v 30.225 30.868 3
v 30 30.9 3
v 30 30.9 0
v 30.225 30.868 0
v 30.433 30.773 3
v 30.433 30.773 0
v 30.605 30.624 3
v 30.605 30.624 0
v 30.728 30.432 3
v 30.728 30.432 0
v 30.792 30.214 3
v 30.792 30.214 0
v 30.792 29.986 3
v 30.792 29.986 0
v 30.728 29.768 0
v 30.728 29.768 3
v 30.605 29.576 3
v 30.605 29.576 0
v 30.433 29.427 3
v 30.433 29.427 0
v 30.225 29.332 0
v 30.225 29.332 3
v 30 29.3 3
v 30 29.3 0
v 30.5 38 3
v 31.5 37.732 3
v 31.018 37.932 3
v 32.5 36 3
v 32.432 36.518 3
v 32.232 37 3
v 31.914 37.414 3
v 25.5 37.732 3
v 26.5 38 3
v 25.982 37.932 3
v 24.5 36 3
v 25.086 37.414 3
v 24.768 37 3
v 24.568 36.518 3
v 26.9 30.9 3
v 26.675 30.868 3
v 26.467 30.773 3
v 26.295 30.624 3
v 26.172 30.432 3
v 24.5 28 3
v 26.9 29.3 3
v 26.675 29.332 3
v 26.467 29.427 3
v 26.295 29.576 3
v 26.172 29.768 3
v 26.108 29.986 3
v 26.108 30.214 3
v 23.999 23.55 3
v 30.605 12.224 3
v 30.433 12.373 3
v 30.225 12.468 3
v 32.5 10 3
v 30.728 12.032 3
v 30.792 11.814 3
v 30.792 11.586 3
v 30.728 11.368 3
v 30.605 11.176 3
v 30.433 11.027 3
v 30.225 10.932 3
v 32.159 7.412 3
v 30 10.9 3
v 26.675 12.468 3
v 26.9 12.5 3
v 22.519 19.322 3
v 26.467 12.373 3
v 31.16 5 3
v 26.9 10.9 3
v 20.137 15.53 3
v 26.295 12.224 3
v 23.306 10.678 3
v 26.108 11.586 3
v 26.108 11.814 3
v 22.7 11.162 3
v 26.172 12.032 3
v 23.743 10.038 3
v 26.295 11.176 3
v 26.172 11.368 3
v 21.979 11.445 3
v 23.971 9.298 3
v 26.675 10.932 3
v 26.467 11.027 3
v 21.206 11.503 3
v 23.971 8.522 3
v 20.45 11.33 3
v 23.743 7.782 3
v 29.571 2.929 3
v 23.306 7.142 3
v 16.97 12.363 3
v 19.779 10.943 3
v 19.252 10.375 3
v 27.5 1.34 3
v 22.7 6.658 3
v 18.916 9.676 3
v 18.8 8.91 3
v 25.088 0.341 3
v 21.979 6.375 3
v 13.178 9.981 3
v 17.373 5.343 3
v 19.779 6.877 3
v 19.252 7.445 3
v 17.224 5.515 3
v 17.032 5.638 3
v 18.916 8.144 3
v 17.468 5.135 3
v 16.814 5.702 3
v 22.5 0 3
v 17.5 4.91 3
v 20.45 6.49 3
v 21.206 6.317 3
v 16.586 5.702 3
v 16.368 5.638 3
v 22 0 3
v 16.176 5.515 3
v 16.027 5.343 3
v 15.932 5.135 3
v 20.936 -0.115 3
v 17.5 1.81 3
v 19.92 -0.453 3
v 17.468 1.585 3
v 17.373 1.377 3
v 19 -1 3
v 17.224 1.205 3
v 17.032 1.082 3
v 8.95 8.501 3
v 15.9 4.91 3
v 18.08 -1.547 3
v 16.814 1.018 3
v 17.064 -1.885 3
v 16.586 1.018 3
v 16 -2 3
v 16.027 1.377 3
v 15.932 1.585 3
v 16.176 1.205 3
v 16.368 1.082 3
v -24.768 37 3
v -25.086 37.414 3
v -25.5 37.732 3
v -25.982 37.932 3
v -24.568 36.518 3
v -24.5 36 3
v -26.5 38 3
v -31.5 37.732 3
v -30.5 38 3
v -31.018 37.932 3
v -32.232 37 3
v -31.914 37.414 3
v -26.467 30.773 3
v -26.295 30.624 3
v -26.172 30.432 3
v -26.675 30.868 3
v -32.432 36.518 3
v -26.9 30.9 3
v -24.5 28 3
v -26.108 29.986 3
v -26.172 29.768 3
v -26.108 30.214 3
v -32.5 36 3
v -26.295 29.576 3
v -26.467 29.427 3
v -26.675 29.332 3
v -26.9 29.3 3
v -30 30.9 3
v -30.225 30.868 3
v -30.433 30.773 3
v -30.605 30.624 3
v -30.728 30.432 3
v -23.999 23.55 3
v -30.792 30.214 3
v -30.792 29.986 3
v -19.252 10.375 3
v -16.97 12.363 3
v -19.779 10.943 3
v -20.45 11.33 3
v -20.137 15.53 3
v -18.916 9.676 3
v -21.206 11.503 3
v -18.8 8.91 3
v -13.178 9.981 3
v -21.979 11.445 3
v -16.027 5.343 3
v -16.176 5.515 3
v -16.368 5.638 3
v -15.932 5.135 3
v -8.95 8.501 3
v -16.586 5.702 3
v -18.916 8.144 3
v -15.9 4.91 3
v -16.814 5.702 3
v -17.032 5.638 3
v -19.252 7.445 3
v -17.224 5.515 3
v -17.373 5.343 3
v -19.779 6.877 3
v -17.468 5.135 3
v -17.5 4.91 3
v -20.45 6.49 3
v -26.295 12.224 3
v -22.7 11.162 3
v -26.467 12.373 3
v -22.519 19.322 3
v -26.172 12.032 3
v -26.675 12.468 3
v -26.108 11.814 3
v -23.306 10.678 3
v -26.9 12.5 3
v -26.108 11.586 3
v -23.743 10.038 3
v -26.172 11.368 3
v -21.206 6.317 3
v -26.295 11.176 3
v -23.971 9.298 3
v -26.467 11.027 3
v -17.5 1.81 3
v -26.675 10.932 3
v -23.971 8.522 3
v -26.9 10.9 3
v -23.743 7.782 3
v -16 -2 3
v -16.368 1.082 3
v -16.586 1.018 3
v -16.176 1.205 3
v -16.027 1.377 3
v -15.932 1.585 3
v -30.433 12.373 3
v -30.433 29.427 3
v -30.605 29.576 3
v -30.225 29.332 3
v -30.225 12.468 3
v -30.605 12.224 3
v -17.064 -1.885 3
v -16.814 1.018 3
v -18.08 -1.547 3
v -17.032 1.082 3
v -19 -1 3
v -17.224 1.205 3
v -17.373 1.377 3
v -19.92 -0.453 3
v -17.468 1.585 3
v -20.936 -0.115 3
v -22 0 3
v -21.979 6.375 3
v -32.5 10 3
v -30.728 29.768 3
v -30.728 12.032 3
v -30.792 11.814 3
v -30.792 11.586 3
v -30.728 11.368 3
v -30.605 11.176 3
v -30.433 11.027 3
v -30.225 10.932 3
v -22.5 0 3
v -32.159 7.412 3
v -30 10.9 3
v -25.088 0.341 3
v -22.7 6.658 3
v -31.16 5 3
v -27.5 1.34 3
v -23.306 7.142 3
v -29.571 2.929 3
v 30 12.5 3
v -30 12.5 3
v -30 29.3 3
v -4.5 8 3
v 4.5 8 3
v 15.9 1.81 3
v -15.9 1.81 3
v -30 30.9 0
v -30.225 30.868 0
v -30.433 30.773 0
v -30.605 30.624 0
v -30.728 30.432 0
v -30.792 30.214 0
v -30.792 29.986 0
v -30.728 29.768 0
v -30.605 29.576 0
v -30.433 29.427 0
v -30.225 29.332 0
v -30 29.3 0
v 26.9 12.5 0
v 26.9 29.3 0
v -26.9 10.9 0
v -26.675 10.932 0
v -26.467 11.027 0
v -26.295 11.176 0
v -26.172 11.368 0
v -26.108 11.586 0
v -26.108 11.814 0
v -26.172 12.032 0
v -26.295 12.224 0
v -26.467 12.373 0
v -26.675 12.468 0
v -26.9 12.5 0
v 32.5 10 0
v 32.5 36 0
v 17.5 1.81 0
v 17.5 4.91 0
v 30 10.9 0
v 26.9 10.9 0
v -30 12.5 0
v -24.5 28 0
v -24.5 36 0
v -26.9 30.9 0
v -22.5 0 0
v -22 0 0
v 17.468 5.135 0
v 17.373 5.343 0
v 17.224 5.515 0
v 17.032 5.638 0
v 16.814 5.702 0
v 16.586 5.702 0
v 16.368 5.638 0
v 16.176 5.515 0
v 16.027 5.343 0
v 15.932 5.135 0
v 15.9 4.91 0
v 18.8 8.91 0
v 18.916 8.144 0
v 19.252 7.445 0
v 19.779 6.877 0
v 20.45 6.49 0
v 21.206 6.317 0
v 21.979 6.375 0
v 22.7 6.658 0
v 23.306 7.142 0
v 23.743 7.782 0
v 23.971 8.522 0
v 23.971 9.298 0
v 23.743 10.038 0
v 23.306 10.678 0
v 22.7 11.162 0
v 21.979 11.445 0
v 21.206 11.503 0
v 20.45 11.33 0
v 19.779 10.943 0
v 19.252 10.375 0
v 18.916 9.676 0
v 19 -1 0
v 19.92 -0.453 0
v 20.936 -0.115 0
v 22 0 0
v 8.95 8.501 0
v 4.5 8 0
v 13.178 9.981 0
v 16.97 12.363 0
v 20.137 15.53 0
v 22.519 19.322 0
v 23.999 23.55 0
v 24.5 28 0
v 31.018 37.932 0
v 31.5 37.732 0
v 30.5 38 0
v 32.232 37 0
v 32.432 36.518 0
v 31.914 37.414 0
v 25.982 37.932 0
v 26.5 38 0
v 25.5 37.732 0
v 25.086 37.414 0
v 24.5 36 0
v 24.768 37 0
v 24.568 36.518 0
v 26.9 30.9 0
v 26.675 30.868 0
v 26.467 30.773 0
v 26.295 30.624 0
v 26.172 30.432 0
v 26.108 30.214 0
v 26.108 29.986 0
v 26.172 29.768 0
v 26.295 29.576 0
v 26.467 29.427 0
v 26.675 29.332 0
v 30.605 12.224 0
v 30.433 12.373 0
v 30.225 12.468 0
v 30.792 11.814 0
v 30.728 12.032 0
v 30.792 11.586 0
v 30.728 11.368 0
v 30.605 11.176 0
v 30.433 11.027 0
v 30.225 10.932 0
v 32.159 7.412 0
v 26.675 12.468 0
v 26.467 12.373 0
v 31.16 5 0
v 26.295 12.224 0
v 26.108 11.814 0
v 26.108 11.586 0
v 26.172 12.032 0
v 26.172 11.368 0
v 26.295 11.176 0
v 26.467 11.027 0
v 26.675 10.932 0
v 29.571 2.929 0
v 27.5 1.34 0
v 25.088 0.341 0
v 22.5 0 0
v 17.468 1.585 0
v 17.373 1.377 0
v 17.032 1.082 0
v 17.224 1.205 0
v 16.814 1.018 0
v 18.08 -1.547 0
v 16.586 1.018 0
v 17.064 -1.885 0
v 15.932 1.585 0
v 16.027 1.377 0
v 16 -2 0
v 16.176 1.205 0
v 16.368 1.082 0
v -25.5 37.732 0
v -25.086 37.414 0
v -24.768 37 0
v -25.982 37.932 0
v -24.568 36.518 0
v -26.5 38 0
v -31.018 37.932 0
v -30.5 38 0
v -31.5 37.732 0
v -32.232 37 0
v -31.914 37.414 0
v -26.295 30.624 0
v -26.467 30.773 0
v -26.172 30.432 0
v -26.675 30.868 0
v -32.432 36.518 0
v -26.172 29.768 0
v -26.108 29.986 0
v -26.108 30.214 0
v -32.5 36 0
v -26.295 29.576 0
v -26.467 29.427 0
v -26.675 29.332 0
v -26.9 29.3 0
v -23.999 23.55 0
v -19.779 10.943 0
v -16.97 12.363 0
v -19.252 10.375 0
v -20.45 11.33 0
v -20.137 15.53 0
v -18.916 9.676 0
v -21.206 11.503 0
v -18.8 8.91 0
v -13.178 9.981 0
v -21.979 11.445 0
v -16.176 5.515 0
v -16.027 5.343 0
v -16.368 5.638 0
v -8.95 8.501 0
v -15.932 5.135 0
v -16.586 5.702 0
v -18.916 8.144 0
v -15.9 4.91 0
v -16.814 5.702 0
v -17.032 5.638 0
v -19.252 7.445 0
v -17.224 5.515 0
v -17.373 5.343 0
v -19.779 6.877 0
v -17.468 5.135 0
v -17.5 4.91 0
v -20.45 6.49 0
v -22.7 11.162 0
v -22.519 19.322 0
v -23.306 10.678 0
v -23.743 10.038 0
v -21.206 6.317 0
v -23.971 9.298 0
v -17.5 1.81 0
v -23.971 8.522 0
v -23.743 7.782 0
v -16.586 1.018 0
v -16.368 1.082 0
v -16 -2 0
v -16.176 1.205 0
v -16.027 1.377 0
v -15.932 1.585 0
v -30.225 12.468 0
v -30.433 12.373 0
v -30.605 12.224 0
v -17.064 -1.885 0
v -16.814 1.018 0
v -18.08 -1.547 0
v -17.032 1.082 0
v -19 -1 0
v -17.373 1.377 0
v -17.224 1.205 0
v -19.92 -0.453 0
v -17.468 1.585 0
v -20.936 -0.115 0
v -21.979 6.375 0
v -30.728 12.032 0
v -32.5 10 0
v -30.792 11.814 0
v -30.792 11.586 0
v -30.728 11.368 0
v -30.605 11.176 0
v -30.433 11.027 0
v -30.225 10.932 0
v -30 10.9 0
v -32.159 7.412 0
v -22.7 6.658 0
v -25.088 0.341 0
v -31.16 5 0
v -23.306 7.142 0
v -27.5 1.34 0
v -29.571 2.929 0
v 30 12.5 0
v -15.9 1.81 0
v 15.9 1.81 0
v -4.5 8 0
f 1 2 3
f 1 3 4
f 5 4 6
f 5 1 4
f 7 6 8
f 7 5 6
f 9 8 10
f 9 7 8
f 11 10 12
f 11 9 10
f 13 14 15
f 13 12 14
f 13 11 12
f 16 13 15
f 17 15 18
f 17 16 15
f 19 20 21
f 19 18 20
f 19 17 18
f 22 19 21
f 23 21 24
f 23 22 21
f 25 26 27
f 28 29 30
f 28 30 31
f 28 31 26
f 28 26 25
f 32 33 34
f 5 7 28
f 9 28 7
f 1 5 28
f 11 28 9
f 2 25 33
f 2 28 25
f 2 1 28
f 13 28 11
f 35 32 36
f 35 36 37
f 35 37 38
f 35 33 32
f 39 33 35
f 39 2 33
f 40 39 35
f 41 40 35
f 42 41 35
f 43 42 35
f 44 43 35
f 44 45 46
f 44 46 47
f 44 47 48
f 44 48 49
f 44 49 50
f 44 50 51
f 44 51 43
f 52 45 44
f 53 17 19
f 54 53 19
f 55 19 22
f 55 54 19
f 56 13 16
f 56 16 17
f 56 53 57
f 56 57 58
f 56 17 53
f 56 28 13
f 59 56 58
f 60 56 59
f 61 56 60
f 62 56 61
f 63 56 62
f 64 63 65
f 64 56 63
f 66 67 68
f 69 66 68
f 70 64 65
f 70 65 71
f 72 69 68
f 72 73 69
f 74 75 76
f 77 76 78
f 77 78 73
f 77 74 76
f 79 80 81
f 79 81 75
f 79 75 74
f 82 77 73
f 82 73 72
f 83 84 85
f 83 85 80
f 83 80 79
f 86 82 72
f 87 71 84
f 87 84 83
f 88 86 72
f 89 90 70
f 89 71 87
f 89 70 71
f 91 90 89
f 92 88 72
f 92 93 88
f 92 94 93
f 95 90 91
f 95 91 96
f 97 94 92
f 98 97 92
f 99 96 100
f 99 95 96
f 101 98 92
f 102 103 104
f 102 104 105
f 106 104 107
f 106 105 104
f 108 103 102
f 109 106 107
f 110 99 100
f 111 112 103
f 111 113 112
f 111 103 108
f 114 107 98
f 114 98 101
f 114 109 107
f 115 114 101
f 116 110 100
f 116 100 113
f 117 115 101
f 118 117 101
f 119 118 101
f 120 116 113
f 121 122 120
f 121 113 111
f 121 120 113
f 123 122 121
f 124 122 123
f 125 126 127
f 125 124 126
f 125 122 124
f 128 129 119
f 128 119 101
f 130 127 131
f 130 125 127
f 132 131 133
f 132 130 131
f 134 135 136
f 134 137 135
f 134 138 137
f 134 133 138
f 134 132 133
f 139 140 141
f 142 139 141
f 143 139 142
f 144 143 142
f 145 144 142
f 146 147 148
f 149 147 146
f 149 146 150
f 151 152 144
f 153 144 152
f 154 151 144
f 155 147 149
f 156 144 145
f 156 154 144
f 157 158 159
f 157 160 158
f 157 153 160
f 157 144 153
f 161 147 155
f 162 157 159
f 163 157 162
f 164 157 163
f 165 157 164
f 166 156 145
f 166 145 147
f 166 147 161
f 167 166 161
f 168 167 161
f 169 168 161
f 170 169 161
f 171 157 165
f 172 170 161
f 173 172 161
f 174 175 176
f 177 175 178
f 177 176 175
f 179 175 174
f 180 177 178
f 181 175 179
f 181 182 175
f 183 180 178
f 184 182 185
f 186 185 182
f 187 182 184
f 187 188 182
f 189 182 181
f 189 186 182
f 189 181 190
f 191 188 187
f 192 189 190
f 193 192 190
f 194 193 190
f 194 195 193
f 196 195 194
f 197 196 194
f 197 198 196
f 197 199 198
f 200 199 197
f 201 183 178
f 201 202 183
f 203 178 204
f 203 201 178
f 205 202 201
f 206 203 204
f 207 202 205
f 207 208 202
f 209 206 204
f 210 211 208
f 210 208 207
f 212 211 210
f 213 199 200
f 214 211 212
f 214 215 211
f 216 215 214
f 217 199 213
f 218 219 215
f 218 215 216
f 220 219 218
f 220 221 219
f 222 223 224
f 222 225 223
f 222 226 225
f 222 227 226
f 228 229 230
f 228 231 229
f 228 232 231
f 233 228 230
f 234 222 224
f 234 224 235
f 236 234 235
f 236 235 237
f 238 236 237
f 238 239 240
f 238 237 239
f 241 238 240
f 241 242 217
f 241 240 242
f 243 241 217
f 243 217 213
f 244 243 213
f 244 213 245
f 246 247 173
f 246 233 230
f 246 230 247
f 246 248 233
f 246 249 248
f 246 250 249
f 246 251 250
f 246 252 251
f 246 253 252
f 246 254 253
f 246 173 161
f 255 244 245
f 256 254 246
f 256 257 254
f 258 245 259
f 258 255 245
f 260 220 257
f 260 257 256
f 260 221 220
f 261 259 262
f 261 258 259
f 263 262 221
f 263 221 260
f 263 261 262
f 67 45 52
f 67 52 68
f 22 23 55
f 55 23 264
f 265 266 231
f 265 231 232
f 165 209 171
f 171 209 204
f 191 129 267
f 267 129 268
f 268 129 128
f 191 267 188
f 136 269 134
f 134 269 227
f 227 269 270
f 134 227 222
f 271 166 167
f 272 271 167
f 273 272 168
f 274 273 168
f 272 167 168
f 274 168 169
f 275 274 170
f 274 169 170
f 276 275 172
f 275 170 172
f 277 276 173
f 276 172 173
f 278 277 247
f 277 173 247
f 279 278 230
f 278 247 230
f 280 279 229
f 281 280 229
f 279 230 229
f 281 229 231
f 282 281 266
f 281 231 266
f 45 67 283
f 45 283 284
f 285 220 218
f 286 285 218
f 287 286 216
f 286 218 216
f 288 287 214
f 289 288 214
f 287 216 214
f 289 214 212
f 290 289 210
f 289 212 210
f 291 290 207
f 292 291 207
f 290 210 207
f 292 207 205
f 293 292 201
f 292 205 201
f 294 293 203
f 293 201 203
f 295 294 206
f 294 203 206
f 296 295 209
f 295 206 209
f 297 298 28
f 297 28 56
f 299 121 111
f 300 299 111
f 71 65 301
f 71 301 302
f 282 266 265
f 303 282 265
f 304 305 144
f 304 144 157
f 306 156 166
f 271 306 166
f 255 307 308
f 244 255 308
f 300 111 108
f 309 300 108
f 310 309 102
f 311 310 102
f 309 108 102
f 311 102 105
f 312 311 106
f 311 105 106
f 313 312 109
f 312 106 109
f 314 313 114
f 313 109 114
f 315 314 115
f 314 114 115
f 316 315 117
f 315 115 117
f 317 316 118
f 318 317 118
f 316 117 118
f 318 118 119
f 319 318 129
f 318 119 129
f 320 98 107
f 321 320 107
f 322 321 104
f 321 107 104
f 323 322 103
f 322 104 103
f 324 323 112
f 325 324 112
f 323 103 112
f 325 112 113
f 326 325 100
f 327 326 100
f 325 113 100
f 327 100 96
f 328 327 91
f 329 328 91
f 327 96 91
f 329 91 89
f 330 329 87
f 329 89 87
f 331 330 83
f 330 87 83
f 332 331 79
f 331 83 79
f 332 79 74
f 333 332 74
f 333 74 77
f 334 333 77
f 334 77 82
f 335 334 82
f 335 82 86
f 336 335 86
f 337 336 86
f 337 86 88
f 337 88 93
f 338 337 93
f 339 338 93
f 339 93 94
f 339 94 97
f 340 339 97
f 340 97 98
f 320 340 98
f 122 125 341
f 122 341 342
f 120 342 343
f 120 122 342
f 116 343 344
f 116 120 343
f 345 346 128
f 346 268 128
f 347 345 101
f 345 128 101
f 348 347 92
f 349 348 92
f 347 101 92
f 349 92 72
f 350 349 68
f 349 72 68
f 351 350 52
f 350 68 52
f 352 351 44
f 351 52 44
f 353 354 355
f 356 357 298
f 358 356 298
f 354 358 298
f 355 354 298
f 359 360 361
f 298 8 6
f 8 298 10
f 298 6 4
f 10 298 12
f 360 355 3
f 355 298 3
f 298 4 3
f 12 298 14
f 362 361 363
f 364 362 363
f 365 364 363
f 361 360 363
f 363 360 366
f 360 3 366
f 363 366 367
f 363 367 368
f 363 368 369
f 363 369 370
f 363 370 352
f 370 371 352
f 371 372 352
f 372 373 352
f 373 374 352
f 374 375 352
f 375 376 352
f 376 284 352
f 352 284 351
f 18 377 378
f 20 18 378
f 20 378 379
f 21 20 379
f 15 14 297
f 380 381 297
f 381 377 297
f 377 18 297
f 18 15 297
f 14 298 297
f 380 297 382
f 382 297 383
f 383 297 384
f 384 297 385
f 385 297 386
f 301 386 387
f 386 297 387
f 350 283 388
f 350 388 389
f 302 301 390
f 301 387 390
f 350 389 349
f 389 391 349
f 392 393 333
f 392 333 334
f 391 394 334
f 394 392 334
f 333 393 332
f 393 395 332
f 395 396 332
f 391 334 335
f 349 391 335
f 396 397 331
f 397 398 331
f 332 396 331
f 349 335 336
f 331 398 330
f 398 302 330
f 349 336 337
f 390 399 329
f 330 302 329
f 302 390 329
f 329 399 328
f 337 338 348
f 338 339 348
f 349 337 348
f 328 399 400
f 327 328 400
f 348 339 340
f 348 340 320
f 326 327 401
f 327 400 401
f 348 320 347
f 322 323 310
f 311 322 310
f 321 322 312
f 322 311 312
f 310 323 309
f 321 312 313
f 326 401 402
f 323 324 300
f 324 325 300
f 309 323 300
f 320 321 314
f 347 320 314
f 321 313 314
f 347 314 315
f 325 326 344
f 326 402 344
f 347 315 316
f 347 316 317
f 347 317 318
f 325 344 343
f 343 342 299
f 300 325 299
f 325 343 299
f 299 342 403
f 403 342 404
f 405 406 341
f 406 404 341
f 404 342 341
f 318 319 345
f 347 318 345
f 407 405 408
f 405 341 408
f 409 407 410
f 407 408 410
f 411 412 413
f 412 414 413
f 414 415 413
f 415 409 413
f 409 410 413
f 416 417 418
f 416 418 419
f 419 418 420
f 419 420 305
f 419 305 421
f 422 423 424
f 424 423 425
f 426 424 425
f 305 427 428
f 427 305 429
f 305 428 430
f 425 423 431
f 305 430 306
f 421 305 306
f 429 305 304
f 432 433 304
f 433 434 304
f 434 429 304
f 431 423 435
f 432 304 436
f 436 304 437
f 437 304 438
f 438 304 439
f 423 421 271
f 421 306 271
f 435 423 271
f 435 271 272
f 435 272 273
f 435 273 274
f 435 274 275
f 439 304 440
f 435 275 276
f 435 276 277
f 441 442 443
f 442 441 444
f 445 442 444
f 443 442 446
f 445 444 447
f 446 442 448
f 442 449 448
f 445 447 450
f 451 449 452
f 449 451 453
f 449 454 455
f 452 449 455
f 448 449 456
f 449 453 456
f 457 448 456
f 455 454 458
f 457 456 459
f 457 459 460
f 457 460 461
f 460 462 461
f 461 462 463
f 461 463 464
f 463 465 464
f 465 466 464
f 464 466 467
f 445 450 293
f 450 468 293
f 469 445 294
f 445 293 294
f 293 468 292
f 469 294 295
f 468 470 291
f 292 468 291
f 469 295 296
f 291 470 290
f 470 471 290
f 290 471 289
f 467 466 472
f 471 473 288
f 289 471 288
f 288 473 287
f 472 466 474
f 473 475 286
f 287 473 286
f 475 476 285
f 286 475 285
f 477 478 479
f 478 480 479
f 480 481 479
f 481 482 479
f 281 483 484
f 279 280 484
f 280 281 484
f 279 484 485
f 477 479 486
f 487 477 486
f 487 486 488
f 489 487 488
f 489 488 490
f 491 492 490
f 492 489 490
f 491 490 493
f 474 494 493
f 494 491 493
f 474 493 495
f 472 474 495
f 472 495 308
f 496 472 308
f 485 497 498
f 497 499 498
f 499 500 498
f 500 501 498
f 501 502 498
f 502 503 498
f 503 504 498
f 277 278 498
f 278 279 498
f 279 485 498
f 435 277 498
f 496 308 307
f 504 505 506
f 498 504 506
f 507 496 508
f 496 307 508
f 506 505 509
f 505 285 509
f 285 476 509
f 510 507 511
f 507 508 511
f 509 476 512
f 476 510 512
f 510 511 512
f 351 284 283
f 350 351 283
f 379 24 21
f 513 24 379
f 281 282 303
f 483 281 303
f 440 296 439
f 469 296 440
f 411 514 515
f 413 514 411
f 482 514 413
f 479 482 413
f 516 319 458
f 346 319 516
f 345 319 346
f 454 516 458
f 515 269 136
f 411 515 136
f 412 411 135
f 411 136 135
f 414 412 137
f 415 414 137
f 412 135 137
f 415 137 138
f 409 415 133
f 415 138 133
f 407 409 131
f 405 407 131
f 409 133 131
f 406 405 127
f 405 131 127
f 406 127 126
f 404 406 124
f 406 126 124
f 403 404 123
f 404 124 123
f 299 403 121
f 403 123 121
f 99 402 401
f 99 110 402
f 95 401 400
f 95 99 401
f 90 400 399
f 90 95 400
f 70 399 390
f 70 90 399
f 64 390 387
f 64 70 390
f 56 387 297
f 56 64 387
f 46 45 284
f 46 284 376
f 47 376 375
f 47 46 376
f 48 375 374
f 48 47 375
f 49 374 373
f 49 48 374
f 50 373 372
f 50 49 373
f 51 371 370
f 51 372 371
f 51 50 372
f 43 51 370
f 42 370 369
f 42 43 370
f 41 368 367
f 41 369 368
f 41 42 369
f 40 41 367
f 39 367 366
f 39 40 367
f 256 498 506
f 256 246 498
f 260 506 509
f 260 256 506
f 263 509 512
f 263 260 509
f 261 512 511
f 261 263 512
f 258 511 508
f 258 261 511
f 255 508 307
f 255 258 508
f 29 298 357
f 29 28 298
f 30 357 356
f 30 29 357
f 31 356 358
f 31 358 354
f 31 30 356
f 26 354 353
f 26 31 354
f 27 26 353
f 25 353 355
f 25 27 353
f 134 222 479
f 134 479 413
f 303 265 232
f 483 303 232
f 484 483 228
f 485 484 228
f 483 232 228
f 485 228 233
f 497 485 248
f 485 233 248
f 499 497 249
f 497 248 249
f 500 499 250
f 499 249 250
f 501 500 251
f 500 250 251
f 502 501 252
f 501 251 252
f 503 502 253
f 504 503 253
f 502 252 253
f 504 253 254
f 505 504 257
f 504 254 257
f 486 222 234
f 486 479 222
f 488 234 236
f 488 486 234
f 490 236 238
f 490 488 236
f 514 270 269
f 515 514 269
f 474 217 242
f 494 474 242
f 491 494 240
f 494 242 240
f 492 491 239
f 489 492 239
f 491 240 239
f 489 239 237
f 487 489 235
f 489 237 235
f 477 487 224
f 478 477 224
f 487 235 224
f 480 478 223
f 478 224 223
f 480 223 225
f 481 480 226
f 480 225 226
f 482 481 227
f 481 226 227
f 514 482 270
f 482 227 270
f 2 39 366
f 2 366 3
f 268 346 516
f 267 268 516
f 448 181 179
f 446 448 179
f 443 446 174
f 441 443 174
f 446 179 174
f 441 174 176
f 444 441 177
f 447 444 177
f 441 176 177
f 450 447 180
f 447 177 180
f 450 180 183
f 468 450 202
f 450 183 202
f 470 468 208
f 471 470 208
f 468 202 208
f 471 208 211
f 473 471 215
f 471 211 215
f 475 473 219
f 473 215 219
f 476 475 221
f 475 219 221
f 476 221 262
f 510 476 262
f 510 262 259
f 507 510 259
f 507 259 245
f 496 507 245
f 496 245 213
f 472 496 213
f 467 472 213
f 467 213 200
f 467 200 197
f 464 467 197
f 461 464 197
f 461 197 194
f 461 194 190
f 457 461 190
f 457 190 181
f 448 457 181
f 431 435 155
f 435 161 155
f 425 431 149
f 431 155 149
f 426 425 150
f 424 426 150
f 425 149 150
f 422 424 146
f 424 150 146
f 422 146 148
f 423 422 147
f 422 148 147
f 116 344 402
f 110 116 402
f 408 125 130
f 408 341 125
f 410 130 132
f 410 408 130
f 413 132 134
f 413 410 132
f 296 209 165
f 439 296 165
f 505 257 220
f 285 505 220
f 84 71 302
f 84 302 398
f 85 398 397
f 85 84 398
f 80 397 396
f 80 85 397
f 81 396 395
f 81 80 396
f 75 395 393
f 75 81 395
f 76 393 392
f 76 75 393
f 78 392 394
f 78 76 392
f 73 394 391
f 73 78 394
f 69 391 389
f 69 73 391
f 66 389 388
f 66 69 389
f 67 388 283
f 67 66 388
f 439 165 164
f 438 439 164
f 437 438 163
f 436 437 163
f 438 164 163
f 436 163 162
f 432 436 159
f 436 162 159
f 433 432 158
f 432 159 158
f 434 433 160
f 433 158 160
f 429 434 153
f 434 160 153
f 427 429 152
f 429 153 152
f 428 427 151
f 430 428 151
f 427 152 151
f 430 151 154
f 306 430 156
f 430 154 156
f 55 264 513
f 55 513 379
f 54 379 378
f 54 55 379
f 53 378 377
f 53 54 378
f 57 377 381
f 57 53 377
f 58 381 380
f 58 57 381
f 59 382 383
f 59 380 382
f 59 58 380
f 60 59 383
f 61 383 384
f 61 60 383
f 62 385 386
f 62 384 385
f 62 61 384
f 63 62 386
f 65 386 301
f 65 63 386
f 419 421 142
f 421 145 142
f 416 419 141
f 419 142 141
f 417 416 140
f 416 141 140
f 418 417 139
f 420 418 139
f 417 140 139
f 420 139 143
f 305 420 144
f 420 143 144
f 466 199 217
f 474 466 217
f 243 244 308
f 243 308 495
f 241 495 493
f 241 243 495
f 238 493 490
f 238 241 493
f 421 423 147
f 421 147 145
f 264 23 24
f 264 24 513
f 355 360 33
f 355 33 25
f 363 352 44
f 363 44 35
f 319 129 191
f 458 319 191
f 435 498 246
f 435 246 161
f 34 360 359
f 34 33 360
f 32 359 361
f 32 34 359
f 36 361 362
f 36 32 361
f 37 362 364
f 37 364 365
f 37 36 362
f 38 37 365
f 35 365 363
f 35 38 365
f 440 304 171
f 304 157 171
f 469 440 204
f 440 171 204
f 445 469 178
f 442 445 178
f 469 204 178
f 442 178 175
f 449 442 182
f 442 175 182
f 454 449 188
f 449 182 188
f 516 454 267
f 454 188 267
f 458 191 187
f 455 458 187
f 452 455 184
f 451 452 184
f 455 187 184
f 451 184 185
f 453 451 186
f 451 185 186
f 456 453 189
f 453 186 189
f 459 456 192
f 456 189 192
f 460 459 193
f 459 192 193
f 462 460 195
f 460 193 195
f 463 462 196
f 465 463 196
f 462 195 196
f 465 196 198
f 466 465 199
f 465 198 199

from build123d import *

# Parameters (mm, degrees)
BOSS_EXTRUDE1_DEPTH = 3
FILLET1_R           = 20
CUT_EXTRUDE1_DEPTH  = 51.092414595
SKETCH3_R           = 2.6
CUT_EXTRUDE2_DEPTH  = 51.092414595
FILLET2_R           = 10
FILLET3_R           = 2
SKETCH4_W           = 36
SKETCH4_H           = 2
BOSS_EXTRUDE2_DEPTH = 3
FILLET4_R           = 5
FILLET5_R           = 5


with BuildPart() as part:
    # Sketch1 → Boss-Extrude1 (new body)
    with BuildSketch(Plane.XY):
        Polygon((0, 0), (-32.5, 0), (-32.5, 38), (-24.5, 38), (-24.5, 8), (0, 8), (24.5, 8), (24.5, 38), (32.5, 38), (32.5, 0), align=None)
    extrude(amount=BOSS_EXTRUDE1_DEPTH)

    # Fillet1
    fillet1_edges = [part.edges().sort_by_distance(p)[0] for p in [
        (24.5, 8, 1.5),
        (-24.5, 8, 1.5),
    ]]
    fillet(fillet1_edges, radius=FILLET1_R)

    # Sketch2 → Cut-Extrude1 (cut, through all)
    with BuildSketch(Plane.XY.offset(3)):
        with BuildLine():
            Line((-30, 10.9), (-26.9, 10.9))
            ThreePointArc((-26.9, 10.9), (-26.1, 11.7), (-26.9, 12.5))
            Line((-26.9, 12.5), (-26.9, 29.3))
            ThreePointArc((-26.9, 29.3), (-26.1, 30.1), (-26.9, 30.9))
            Line((-26.9, 30.9), (-30, 30.9))
            ThreePointArc((-30, 30.9), (-30.8, 30.1), (-30, 29.3))
            Line((-30, 29.3), (-30, 12.5))
            ThreePointArc((-30, 12.5), (-30.8, 11.7), (-30, 10.9))
        make_face()
        with BuildLine():
            Line((26.9, 12.5), (26.9, 29.3))
            ThreePointArc((26.9, 29.3), (26.1, 30.1), (26.9, 30.9))
            Line((26.9, 30.9), (30, 30.9))
            ThreePointArc((30, 30.9), (30.8, 30.1), (30, 29.3))
            Line((30, 29.3), (30, 12.5))
            ThreePointArc((30, 12.5), (30.8, 11.7), (30, 10.9))
            Line((30, 10.9), (26.9, 10.9))
            ThreePointArc((26.9, 10.9), (26.1, 11.7), (26.9, 12.5))
        make_face()
        with BuildLine():
            Line((-15.9, 1.81), (15.9, 1.81))
            ThreePointArc((15.9, 1.81), (16.7, 1.01), (17.5, 1.81))
            Line((17.5, 1.81), (17.5, 4.91))
            ThreePointArc((17.5, 4.91), (16.7, 5.71), (15.9, 4.91))
            Line((15.9, 4.91), (-15.9, 4.91))
            ThreePointArc((-15.9, 4.91), (-16.7, 5.71), (-17.5, 4.91))
            Line((-17.5, 4.91), (-17.5, 1.81))
            ThreePointArc((-17.5, 1.81), (-16.7, 1.01), (-15.9, 1.81))
        make_face()
    extrude(amount=-CUT_EXTRUDE1_DEPTH, mode=Mode.SUBTRACT)

    # Sketch3 → Cut-Extrude2 (cut, through all)
    with BuildSketch(Plane.XY.offset(3)):
        with Locations((-21.4, 8.91)):
            Circle(SKETCH3_R)
        with Locations(Location((21.4, 8.91, 0), (0, 0, 180))):
            Circle(SKETCH3_R)
    extrude(amount=-CUT_EXTRUDE2_DEPTH, mode=Mode.SUBTRACT)

    # Fillet2
    fillet2_edges = [part.edges().sort_by_distance(p)[0] for p in [
        (32.5, 0, 1.5),
        (-32.5, 0, 1.5),
    ]]
    fillet(fillet2_edges, radius=FILLET2_R)

    # Fillet3
    fillet3_edges = [part.edges().sort_by_distance(p)[0] for p in [
        (24.5, 38, 1.5),
        (32.5, 38, 1.5),
        (-32.5, 38, 1.5),
        (-24.5, 38, 1.5),
    ]]
    fillet(fillet3_edges, radius=FILLET3_R)

    # Sketch4 → Boss-Extrude2 (add)
    with BuildSketch(Plane.XY.offset(3)):
        with Locations((0, -1)):
            Rectangle(SKETCH4_W, SKETCH4_H)
    extrude(amount=-BOSS_EXTRUDE2_DEPTH)

    # Fillet4
    # the kernel refuses this fillet: 5 mm, written as the material it adds along each edge
    with BuildSketch(Plane(origin=(-18, 0, 3), x_dir=(-1, 0, 0), z_dir=(0, 0, -1))) as fillet4_piece_1:
        with BuildLine():
            CenterArc((4, -5), FILLET4_R, 90, 53.130102354)
            Line((0, -2), (0, 0))
            Line((0, 0), (4, 0))
        make_face()
    extrude(amount=3)
    with BuildSketch(Plane(origin=(18, 0, 3), x_dir=(1, 0, 0), z_dir=(0, 0, -1))) as fillet4_piece_2:
        with BuildLine():
            CenterArc((4, 5), FILLET4_R, 216.869897646, 53.130102354)
            Line((0, 2), (0, 0))
            Line((0, 0), (4, 0))
        make_face()
    extrude(amount=3)

    # Fillet5
    fillet5_edges = [part.edges().sort_by_distance(p)[0] for p in [
        (-18, -2, 1.5),
        (18, -2, 1.5),
    ]]
    fillet(fillet5_edges, radius=FILLET5_R)


solid = part.part
